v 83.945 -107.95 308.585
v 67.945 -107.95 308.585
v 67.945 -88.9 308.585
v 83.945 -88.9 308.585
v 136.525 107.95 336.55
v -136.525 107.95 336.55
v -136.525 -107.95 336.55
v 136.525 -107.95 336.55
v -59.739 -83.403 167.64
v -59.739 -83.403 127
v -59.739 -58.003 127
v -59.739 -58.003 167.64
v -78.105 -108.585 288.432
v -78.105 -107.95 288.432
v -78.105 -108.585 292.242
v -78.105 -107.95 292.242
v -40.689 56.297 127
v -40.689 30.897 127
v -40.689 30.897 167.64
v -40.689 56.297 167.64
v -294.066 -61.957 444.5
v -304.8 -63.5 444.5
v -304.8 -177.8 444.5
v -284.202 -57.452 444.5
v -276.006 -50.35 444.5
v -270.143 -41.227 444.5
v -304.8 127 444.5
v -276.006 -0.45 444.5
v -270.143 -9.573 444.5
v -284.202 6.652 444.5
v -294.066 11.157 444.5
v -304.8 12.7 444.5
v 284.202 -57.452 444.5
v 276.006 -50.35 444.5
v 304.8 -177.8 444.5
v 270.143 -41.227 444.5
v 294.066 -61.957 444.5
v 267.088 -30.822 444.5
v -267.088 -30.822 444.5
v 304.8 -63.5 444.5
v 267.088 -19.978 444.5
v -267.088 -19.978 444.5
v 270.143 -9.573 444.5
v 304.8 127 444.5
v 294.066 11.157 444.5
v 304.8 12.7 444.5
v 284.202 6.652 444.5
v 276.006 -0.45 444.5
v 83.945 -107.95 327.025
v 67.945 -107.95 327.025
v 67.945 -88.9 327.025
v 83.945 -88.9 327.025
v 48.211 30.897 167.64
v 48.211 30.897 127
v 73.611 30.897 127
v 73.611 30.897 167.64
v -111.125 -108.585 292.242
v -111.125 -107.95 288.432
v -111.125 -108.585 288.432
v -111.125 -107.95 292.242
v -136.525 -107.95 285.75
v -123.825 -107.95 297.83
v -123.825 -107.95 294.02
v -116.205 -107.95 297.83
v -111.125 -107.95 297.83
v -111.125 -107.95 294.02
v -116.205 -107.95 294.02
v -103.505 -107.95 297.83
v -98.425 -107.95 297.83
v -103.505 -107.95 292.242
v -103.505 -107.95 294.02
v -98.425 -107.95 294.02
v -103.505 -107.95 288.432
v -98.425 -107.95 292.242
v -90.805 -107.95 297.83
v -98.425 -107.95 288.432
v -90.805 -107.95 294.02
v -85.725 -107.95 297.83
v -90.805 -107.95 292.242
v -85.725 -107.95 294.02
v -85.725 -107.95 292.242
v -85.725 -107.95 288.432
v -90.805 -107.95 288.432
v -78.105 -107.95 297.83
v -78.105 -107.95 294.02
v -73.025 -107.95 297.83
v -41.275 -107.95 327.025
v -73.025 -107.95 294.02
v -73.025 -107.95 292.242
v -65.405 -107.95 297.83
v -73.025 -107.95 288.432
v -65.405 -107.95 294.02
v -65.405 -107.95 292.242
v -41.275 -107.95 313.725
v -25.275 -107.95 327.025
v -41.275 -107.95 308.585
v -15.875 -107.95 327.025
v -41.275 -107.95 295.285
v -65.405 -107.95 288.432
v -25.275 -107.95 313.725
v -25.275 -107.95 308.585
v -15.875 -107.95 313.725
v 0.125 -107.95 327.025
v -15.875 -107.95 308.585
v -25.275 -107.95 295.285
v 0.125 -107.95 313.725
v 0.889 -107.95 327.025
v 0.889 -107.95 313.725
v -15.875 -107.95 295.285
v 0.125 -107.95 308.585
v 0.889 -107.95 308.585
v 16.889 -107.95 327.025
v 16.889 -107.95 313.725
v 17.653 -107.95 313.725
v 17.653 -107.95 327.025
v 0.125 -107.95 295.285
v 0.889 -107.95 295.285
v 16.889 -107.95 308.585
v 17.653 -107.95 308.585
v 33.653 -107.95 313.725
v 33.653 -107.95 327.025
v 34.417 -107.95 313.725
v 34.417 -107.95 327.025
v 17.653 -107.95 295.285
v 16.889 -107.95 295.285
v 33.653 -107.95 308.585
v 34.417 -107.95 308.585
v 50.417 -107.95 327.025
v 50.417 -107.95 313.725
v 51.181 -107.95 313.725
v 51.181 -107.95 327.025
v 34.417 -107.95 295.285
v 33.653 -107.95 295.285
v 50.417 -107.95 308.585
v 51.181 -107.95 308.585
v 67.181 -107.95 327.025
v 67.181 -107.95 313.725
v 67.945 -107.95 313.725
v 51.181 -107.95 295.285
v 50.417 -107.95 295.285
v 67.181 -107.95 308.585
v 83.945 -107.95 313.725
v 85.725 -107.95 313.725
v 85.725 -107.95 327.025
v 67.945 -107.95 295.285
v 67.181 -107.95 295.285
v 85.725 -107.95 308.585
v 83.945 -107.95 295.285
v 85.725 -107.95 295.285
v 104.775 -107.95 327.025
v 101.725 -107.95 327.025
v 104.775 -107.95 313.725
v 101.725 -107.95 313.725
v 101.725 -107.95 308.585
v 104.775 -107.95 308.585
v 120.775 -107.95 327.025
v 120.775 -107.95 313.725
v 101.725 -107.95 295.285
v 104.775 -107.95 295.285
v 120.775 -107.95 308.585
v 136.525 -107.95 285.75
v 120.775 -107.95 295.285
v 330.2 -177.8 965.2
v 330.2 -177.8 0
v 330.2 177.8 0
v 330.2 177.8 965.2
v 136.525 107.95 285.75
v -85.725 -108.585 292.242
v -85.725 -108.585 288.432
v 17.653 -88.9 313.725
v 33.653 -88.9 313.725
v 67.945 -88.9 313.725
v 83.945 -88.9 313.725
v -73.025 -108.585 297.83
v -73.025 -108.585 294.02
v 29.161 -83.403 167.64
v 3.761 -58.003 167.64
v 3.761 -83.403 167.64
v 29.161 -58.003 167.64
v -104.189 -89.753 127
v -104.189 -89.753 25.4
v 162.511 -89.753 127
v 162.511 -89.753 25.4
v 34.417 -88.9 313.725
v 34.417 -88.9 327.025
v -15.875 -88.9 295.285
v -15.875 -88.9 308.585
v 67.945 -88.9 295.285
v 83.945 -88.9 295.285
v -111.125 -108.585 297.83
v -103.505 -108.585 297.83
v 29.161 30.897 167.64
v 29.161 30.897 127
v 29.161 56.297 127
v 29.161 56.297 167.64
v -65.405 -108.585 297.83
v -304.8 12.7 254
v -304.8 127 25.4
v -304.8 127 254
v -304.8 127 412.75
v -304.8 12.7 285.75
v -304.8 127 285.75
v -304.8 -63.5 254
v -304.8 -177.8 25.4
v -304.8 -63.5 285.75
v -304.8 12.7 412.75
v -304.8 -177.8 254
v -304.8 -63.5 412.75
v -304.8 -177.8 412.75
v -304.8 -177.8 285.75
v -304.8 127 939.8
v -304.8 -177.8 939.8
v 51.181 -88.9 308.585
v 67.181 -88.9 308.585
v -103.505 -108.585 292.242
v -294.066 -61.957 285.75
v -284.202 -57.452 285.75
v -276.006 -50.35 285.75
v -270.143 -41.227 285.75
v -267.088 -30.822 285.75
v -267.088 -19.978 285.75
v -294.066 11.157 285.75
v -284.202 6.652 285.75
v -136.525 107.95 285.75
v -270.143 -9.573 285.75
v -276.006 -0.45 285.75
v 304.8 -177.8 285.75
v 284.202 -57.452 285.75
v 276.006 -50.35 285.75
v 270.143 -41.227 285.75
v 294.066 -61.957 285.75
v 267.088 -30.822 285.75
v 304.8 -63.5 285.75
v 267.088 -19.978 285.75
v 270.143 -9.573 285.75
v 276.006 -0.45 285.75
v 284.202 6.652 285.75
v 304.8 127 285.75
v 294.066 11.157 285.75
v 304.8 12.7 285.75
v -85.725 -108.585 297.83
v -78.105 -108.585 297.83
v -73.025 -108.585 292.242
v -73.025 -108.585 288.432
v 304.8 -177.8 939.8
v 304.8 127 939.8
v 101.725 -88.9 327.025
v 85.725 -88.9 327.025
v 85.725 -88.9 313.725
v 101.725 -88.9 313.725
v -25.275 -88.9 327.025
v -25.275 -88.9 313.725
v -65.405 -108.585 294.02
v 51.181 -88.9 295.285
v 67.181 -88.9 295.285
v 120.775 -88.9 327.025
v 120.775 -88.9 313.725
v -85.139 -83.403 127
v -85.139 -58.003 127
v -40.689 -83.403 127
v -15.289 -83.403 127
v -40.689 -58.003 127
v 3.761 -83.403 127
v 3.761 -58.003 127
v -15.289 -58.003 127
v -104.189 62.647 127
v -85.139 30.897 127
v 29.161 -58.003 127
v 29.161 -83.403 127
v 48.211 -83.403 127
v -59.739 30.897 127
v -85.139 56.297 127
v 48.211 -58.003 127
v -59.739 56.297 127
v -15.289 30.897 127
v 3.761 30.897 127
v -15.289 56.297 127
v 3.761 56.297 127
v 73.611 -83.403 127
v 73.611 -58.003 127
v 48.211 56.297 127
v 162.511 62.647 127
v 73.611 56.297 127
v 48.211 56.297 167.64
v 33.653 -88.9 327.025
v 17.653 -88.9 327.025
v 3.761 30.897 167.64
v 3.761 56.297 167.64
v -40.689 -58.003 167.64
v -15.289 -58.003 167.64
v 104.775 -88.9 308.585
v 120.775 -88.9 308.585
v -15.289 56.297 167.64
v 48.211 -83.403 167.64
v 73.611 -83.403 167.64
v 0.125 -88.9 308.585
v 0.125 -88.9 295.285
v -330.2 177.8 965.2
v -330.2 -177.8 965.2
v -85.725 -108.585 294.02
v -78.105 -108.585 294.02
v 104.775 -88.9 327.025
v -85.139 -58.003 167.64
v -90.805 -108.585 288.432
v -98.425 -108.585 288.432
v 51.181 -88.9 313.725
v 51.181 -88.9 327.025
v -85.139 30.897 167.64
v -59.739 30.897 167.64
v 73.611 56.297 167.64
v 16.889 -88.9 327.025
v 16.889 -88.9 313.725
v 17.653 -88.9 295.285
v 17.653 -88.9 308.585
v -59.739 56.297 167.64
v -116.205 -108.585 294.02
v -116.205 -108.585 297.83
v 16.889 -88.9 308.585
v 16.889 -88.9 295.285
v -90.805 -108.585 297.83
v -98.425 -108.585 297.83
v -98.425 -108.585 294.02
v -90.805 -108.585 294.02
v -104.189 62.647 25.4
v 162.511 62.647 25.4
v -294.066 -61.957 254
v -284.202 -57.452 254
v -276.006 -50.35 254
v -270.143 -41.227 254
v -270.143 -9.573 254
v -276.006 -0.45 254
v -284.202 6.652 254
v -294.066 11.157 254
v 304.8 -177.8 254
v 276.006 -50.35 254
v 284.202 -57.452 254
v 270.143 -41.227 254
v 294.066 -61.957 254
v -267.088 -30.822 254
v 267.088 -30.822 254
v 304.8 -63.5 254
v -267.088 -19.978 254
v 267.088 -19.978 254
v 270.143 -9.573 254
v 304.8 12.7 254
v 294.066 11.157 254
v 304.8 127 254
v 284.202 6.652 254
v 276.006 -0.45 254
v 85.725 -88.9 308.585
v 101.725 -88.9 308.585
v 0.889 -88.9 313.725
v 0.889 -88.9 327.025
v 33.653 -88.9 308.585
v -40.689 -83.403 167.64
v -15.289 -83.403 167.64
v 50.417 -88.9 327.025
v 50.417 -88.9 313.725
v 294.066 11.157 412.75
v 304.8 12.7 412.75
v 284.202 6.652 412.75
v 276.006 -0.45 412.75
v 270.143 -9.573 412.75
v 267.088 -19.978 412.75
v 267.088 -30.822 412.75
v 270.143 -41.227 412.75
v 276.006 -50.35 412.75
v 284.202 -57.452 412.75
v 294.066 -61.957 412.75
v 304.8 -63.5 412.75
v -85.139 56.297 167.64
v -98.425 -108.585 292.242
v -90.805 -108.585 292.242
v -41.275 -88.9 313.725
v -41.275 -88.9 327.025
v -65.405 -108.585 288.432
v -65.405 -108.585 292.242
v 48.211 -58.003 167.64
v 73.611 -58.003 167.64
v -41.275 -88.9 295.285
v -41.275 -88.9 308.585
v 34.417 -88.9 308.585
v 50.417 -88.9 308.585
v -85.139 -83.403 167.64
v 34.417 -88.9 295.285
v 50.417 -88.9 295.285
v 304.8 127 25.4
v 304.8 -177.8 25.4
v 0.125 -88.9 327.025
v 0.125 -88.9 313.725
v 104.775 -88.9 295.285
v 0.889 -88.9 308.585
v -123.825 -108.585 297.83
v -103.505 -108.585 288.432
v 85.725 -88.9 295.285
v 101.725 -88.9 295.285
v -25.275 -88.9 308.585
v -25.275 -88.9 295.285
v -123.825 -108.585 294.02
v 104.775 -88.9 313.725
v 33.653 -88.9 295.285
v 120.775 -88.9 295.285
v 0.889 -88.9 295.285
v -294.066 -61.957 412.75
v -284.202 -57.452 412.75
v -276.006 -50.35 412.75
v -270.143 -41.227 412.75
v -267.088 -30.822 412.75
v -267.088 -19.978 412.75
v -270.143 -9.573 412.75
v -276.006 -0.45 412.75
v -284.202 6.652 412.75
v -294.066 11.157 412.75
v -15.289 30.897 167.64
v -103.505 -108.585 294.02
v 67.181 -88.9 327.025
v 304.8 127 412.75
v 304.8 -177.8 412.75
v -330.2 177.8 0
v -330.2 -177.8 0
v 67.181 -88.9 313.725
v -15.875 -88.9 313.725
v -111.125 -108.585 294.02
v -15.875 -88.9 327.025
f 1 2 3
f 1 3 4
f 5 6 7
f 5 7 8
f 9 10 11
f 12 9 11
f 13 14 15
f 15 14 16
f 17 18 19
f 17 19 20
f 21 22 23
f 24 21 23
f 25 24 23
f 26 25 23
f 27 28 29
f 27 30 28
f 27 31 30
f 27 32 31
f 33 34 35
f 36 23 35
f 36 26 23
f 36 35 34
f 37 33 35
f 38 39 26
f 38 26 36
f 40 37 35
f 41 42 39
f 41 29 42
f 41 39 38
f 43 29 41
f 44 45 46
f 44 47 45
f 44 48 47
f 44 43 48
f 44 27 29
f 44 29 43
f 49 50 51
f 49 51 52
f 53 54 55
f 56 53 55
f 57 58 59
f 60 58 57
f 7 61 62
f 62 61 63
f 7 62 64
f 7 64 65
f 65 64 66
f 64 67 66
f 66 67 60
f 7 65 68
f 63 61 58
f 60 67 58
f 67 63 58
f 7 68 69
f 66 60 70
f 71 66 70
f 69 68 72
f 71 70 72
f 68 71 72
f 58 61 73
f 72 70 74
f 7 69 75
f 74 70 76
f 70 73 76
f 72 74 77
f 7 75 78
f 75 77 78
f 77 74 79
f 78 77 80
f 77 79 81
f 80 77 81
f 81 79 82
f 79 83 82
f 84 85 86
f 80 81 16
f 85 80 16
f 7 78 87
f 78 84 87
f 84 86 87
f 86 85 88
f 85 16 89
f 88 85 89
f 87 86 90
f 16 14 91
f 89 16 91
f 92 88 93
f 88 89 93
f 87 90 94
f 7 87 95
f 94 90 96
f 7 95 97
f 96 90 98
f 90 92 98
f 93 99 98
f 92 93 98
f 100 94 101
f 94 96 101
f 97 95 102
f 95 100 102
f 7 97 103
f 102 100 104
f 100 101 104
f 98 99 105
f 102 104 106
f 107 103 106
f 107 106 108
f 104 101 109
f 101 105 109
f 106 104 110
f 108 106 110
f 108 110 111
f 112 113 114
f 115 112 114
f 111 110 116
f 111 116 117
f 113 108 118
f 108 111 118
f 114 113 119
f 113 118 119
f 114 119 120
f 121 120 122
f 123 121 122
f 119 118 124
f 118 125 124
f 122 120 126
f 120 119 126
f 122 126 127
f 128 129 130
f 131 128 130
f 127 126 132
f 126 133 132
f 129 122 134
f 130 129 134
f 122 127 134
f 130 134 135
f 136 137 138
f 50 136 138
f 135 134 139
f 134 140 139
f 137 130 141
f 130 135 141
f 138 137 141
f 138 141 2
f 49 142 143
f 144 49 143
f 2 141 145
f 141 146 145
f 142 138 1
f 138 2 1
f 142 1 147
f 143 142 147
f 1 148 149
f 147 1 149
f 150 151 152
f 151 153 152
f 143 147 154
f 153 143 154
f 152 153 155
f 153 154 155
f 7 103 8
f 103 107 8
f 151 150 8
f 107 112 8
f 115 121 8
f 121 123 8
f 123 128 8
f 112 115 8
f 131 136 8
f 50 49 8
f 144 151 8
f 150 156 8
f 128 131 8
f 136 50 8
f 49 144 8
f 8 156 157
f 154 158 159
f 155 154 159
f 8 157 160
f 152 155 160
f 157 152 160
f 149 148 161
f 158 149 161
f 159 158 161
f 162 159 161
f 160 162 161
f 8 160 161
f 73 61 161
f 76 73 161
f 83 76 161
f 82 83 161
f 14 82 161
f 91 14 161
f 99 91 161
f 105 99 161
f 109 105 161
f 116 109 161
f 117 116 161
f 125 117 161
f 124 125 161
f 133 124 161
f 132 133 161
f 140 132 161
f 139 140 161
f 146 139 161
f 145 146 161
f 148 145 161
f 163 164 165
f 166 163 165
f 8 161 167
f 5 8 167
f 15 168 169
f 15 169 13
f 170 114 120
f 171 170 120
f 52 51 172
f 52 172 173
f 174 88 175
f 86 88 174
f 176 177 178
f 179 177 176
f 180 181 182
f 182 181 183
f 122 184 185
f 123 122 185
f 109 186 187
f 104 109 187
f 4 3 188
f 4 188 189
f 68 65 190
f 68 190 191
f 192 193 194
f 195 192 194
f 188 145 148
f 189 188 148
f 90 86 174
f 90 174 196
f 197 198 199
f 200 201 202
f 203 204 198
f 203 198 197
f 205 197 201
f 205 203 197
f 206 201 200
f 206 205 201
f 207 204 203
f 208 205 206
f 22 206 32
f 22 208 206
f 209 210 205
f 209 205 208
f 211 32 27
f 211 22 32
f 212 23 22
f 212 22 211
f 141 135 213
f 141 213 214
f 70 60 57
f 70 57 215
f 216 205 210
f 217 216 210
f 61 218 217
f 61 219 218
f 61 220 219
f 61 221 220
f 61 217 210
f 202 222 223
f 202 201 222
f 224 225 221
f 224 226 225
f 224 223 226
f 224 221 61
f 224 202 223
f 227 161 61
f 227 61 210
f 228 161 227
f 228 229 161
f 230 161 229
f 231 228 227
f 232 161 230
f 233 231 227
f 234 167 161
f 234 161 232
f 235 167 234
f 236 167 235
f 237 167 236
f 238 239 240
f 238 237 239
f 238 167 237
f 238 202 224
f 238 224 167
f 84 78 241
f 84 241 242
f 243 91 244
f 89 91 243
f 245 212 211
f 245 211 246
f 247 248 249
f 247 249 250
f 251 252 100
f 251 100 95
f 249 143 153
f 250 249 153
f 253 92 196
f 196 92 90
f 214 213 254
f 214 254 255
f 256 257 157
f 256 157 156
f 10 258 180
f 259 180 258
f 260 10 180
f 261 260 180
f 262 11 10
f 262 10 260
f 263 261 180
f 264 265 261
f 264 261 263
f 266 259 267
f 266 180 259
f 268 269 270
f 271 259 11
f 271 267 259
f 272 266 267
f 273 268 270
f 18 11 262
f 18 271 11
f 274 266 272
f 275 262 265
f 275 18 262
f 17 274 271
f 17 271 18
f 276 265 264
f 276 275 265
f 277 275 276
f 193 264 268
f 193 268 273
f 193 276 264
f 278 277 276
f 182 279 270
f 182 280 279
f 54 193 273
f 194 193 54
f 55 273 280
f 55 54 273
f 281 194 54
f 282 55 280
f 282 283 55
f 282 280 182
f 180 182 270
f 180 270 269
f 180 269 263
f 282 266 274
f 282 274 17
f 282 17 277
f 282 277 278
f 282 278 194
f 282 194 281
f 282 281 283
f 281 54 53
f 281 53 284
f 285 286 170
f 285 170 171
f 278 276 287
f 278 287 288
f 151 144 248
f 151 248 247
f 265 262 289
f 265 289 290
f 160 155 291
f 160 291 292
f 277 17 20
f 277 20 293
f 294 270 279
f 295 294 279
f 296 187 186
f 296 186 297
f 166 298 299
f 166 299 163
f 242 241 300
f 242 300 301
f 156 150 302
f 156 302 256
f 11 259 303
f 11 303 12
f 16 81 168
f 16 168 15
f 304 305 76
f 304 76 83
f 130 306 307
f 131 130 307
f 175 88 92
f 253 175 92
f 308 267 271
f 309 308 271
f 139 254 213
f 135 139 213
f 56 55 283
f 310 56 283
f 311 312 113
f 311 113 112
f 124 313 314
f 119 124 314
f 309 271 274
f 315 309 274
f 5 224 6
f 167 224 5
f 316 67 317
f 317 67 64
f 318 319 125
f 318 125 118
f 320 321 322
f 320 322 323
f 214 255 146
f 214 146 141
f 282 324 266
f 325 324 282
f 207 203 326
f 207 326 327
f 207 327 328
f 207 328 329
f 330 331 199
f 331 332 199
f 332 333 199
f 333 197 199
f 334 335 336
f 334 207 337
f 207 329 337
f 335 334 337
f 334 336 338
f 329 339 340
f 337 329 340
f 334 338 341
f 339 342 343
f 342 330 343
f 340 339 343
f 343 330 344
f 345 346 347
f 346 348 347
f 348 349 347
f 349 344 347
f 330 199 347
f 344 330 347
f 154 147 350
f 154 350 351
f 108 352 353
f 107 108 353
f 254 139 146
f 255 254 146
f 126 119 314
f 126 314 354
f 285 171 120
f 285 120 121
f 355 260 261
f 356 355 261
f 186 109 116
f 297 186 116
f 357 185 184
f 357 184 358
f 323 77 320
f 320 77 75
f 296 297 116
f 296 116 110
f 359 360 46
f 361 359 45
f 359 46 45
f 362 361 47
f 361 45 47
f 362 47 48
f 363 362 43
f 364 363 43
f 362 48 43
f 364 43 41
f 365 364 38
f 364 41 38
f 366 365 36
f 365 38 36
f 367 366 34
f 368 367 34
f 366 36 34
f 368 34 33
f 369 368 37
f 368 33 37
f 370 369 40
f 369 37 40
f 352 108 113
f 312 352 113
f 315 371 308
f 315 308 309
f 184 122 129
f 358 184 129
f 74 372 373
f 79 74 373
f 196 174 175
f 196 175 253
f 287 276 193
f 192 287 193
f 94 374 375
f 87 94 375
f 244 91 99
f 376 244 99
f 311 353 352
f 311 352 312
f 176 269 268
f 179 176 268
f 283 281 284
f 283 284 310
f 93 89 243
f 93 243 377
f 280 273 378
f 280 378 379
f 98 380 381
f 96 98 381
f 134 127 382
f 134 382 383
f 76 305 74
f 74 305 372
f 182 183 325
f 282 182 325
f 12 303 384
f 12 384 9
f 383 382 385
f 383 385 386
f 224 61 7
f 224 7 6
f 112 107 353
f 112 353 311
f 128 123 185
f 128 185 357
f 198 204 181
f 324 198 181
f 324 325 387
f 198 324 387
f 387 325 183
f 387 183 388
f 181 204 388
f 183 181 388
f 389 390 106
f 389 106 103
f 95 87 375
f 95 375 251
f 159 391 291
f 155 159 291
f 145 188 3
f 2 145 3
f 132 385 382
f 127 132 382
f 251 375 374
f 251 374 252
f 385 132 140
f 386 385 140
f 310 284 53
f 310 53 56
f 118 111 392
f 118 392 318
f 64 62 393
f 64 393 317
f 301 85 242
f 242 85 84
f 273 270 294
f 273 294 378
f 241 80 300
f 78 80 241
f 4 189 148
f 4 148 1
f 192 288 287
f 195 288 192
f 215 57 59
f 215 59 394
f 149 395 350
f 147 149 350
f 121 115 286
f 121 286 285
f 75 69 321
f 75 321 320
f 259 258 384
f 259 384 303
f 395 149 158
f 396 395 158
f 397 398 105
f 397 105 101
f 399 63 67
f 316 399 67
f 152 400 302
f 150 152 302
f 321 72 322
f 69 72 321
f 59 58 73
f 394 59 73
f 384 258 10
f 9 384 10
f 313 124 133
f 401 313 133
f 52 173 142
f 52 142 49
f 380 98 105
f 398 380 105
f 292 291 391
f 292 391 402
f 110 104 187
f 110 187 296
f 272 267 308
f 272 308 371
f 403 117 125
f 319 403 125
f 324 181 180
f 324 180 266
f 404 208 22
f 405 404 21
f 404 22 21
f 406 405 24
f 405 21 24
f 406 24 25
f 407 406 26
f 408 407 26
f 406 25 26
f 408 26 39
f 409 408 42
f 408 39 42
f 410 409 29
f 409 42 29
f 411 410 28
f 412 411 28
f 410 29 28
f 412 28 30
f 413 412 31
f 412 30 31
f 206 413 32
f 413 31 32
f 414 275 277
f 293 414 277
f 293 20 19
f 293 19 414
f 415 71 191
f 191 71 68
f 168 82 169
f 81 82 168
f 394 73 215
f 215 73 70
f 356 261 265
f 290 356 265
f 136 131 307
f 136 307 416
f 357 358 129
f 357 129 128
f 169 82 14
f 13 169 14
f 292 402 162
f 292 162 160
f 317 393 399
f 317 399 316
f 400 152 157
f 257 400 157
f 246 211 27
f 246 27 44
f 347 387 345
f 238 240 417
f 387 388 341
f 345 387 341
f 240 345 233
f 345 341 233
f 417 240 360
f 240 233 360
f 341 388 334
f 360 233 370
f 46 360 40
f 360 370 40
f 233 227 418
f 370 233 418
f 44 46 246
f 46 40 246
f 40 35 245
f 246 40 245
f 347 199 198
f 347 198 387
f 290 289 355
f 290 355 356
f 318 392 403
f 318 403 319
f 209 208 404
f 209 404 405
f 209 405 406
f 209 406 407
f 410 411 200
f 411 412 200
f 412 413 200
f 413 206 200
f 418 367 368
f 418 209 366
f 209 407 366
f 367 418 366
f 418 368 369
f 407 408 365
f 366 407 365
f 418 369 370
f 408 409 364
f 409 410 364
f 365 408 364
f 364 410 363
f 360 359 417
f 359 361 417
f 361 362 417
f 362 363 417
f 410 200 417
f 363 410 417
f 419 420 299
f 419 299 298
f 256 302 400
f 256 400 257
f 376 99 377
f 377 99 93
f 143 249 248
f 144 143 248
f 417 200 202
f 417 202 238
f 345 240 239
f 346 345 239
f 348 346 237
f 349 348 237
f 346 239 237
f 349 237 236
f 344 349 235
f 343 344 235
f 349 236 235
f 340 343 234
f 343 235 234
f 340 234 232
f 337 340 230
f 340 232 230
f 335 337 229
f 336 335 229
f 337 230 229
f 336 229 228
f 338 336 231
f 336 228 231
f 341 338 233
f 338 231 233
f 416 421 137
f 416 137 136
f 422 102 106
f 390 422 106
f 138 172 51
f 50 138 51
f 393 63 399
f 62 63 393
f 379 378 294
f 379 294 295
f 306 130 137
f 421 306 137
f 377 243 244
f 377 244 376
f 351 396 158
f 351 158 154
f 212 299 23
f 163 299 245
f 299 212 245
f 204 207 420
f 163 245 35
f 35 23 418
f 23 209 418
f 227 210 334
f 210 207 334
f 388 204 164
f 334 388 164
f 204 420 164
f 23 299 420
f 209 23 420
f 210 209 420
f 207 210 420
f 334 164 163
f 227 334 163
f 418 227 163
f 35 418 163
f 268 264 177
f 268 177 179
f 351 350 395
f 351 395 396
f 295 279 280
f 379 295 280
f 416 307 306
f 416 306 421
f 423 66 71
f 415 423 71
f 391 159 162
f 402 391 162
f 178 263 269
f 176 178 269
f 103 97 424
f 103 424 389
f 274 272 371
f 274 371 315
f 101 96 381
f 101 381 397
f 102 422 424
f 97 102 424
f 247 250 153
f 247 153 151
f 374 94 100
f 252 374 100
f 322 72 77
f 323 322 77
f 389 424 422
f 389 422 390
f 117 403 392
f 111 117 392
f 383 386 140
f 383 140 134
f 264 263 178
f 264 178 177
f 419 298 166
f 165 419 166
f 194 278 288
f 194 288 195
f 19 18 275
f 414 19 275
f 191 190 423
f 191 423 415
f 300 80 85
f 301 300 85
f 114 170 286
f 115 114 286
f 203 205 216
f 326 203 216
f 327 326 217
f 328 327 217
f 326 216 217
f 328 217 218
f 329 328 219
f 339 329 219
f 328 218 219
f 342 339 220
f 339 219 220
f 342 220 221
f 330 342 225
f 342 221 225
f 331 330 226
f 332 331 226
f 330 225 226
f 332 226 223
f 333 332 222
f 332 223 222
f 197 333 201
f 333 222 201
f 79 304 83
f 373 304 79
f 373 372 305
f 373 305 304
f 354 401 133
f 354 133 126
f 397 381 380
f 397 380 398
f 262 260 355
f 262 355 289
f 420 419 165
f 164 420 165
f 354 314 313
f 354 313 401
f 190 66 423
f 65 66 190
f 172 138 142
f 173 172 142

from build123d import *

# Parameters (mm, degrees)
F0_W      = 660.4
F0_H      = 355.6
F1_DEPTH  = 965.2
F2_W      = 609.6
F2_H      = 914.4
F3_DEPTH  = 304.8
F4_W      = 609.6
F4_H      = 31.75
F5_DEPTH  = 304.8
F6_W      = 266.7
F6_H      = 152.4
F7_DEPTH  = 101.6
F8_W      = 25.4
F8_H      = 25.4
F9_DEPTH  = 40.64
F10_W     = 273.05
F10_H     = 215.9
F11_DEPTH = 50.8
F12_W     = 16
F12_H     = 13.3
F13_DEPTH = 19.05
F12_W_2   = 7.62
F12_H_2   = 3.81
F14_DEPTH = 0.635
F16_DEPTH = 190.5


# Not quite as in the source:
# - a feature names something its author has since deleted; it is built from what else it names


with BuildPart() as f1:
    # F0 (on Top) → F1 (new body)
    with BuildSketch(Plane.XY):
        Rectangle(F0_W, F0_H)
    extrude(amount=F1_DEPTH)

    # F2 (on face) → F3 (cut)
    with BuildSketch(Plane.XZ.offset(177.8)):
        with Locations((0, 482.6)):
            Rectangle(F2_W, F2_H)
    extrude(amount=-F3_DEPTH, mode=Mode.SUBTRACT)

    # F4 (on face) → F5 (join)
    with BuildSketch(Plane.XZ.offset(-127)):
        with Locations((0, 269.875)):
            Rectangle(F4_W, F4_H)
        with Locations((0, 428.625)):
            Rectangle(F4_W, F4_H)
    extrude(amount=F5_DEPTH)

    # F6 (on face) → F7 (join)
    with BuildSketch(Plane.XY.offset(25.4)):
        with Locations((29.1608499646, -13.5529870272)):
            Rectangle(F6_W, F6_H)
    extrude(amount=F7_DEPTH)

    # F8 (on face) → F9 (join)
    with BuildSketch(Plane.XY.offset(127)):
        with Locations((-72.4391500354, -70.7029870272)):
            Rectangle(F8_W, F8_H)
        with Locations((-72.4391500354, 43.5970129728)):
            Rectangle(F8_W, F8_H)
        with Locations((-27.9891500354, -70.7029870272)):
            Rectangle(F8_W, F8_H)
        with Locations((-27.9891500354, 43.5970129728)):
            Rectangle(F8_W, F8_H)
        with Locations((16.4608499646, -70.7029870272)):
            Rectangle(F8_W, F8_H)
        with Locations((16.4608499646, 43.5970129728)):
            Rectangle(F8_W, F8_H)
        with Locations((60.9108499646, -70.7029870272)):
            Rectangle(F8_W, F8_H)
        with Locations((60.9108499646, 43.5970129728)):
            Rectangle(F8_W, F8_H)
    extrude(amount=F9_DEPTH)

    # F10 (on face) → F11 (join)
    with BuildSketch(Plane.XY.offset(285.75)):
        Rectangle(F10_W, F10_H)
    extrude(amount=F11_DEPTH)

    # F12 (on face) → F13 (cut)
    with BuildSketch(Plane.XZ.offset(107.95)):
        with Locations((112.775, 301.9346)):
            Rectangle(F12_W, F12_H)
        with Locations((112.775, 320.375)):
            Rectangle(F12_W, F12_H)
        with Locations((93.725, 320.375)):
            Rectangle(F12_W, F12_H)
        with Locations((-33.275, 301.9346)):
            Rectangle(F12_W, F12_H)
        with Locations((93.725, 301.9346)):
            Rectangle(F12_W, F12_H)
        with Locations((-7.875, 320.375)):
            Rectangle(F12_W, F12_H)
        with Locations((-7.875, 301.9346)):
            Rectangle(F12_W, F12_H)
        with Locations((8.889, 320.375)):
            Rectangle(F12_W, F12_H)
        with Locations((8.889, 301.9346)):
            Rectangle(F12_W, F12_H)
        with Locations((25.653, 320.375)):
            Rectangle(F12_W, F12_H)
        with Locations((25.653, 301.9346)):
            Rectangle(F12_W, F12_H)
        with Locations((42.417, 320.375)):
            Rectangle(F12_W, F12_H)
        with Locations((42.417, 301.9346)):
            Rectangle(F12_W, F12_H)
        with Locations((59.181, 320.375)):
            Rectangle(F12_W, F12_H)
        with Locations((59.181, 301.9346)):
            Rectangle(F12_W, F12_H)
        with Locations((75.945, 320.375)):
            Rectangle(F12_W, F12_H)
        with Locations((75.945, 301.9346)):
            Rectangle(F12_W, F12_H)
        with Locations((-33.275, 320.375)):
            Rectangle(F12_W, F12_H)
    extrude(amount=-F13_DEPTH, mode=Mode.SUBTRACT)

    # F12 (on face) → F14 (join, symmetric)
    with BuildSketch(Plane.XZ.offset(107.95)):
        with Locations((-120.015, 295.9252057362)):
            Rectangle(F12_W_2, F12_H_2)
        with Locations((-107.315, 295.9252057362)):
            Rectangle(F12_W_2, F12_H_2)
        with Locations((-94.615, 295.9252057362)):
            Rectangle(F12_W_2, F12_H_2)
        with Locations((-81.915, 295.9252057362)):
            Rectangle(F12_W_2, F12_H_2)
        with Locations((-69.215, 295.9252057362)):
            Rectangle(F12_W_2, F12_H_2)
        with Locations((-81.915, 290.3372057362)):
            Rectangle(F12_W_2, F12_H_2)
        with Locations((-107.315, 290.3372057362)):
            Rectangle(F12_W_2, F12_H_2)
        with Locations((-69.215, 290.3372057362)):
            Rectangle(F12_W_2, F12_H_2)
        with Locations((-94.615, 290.3372057362)):
            Rectangle(F12_W_2, F12_H_2)
    extrude(amount=F14_DEPTH, both=True)

    # F15 (on face) → F16 (cut)
    with BuildSketch(Plane.XY.offset(444.5)):
        with BuildLine():
            ThreePointArc((-304.8, -63.5), (-266.7, -25.4), (-304.8, 12.7))
            Line((-304.8, 12.7), (-304.8, -63.5))
        make_face()
        with BuildLine():
            Line((304.8, -63.5), (304.8, 12.7))
            ThreePointArc((304.8, 12.7), (266.7, -25.4), (304.8, -63.5))
        make_face()
    extrude(amount=-F16_DEPTH, mode=Mode.SUBTRACT)


solid = f1.part
